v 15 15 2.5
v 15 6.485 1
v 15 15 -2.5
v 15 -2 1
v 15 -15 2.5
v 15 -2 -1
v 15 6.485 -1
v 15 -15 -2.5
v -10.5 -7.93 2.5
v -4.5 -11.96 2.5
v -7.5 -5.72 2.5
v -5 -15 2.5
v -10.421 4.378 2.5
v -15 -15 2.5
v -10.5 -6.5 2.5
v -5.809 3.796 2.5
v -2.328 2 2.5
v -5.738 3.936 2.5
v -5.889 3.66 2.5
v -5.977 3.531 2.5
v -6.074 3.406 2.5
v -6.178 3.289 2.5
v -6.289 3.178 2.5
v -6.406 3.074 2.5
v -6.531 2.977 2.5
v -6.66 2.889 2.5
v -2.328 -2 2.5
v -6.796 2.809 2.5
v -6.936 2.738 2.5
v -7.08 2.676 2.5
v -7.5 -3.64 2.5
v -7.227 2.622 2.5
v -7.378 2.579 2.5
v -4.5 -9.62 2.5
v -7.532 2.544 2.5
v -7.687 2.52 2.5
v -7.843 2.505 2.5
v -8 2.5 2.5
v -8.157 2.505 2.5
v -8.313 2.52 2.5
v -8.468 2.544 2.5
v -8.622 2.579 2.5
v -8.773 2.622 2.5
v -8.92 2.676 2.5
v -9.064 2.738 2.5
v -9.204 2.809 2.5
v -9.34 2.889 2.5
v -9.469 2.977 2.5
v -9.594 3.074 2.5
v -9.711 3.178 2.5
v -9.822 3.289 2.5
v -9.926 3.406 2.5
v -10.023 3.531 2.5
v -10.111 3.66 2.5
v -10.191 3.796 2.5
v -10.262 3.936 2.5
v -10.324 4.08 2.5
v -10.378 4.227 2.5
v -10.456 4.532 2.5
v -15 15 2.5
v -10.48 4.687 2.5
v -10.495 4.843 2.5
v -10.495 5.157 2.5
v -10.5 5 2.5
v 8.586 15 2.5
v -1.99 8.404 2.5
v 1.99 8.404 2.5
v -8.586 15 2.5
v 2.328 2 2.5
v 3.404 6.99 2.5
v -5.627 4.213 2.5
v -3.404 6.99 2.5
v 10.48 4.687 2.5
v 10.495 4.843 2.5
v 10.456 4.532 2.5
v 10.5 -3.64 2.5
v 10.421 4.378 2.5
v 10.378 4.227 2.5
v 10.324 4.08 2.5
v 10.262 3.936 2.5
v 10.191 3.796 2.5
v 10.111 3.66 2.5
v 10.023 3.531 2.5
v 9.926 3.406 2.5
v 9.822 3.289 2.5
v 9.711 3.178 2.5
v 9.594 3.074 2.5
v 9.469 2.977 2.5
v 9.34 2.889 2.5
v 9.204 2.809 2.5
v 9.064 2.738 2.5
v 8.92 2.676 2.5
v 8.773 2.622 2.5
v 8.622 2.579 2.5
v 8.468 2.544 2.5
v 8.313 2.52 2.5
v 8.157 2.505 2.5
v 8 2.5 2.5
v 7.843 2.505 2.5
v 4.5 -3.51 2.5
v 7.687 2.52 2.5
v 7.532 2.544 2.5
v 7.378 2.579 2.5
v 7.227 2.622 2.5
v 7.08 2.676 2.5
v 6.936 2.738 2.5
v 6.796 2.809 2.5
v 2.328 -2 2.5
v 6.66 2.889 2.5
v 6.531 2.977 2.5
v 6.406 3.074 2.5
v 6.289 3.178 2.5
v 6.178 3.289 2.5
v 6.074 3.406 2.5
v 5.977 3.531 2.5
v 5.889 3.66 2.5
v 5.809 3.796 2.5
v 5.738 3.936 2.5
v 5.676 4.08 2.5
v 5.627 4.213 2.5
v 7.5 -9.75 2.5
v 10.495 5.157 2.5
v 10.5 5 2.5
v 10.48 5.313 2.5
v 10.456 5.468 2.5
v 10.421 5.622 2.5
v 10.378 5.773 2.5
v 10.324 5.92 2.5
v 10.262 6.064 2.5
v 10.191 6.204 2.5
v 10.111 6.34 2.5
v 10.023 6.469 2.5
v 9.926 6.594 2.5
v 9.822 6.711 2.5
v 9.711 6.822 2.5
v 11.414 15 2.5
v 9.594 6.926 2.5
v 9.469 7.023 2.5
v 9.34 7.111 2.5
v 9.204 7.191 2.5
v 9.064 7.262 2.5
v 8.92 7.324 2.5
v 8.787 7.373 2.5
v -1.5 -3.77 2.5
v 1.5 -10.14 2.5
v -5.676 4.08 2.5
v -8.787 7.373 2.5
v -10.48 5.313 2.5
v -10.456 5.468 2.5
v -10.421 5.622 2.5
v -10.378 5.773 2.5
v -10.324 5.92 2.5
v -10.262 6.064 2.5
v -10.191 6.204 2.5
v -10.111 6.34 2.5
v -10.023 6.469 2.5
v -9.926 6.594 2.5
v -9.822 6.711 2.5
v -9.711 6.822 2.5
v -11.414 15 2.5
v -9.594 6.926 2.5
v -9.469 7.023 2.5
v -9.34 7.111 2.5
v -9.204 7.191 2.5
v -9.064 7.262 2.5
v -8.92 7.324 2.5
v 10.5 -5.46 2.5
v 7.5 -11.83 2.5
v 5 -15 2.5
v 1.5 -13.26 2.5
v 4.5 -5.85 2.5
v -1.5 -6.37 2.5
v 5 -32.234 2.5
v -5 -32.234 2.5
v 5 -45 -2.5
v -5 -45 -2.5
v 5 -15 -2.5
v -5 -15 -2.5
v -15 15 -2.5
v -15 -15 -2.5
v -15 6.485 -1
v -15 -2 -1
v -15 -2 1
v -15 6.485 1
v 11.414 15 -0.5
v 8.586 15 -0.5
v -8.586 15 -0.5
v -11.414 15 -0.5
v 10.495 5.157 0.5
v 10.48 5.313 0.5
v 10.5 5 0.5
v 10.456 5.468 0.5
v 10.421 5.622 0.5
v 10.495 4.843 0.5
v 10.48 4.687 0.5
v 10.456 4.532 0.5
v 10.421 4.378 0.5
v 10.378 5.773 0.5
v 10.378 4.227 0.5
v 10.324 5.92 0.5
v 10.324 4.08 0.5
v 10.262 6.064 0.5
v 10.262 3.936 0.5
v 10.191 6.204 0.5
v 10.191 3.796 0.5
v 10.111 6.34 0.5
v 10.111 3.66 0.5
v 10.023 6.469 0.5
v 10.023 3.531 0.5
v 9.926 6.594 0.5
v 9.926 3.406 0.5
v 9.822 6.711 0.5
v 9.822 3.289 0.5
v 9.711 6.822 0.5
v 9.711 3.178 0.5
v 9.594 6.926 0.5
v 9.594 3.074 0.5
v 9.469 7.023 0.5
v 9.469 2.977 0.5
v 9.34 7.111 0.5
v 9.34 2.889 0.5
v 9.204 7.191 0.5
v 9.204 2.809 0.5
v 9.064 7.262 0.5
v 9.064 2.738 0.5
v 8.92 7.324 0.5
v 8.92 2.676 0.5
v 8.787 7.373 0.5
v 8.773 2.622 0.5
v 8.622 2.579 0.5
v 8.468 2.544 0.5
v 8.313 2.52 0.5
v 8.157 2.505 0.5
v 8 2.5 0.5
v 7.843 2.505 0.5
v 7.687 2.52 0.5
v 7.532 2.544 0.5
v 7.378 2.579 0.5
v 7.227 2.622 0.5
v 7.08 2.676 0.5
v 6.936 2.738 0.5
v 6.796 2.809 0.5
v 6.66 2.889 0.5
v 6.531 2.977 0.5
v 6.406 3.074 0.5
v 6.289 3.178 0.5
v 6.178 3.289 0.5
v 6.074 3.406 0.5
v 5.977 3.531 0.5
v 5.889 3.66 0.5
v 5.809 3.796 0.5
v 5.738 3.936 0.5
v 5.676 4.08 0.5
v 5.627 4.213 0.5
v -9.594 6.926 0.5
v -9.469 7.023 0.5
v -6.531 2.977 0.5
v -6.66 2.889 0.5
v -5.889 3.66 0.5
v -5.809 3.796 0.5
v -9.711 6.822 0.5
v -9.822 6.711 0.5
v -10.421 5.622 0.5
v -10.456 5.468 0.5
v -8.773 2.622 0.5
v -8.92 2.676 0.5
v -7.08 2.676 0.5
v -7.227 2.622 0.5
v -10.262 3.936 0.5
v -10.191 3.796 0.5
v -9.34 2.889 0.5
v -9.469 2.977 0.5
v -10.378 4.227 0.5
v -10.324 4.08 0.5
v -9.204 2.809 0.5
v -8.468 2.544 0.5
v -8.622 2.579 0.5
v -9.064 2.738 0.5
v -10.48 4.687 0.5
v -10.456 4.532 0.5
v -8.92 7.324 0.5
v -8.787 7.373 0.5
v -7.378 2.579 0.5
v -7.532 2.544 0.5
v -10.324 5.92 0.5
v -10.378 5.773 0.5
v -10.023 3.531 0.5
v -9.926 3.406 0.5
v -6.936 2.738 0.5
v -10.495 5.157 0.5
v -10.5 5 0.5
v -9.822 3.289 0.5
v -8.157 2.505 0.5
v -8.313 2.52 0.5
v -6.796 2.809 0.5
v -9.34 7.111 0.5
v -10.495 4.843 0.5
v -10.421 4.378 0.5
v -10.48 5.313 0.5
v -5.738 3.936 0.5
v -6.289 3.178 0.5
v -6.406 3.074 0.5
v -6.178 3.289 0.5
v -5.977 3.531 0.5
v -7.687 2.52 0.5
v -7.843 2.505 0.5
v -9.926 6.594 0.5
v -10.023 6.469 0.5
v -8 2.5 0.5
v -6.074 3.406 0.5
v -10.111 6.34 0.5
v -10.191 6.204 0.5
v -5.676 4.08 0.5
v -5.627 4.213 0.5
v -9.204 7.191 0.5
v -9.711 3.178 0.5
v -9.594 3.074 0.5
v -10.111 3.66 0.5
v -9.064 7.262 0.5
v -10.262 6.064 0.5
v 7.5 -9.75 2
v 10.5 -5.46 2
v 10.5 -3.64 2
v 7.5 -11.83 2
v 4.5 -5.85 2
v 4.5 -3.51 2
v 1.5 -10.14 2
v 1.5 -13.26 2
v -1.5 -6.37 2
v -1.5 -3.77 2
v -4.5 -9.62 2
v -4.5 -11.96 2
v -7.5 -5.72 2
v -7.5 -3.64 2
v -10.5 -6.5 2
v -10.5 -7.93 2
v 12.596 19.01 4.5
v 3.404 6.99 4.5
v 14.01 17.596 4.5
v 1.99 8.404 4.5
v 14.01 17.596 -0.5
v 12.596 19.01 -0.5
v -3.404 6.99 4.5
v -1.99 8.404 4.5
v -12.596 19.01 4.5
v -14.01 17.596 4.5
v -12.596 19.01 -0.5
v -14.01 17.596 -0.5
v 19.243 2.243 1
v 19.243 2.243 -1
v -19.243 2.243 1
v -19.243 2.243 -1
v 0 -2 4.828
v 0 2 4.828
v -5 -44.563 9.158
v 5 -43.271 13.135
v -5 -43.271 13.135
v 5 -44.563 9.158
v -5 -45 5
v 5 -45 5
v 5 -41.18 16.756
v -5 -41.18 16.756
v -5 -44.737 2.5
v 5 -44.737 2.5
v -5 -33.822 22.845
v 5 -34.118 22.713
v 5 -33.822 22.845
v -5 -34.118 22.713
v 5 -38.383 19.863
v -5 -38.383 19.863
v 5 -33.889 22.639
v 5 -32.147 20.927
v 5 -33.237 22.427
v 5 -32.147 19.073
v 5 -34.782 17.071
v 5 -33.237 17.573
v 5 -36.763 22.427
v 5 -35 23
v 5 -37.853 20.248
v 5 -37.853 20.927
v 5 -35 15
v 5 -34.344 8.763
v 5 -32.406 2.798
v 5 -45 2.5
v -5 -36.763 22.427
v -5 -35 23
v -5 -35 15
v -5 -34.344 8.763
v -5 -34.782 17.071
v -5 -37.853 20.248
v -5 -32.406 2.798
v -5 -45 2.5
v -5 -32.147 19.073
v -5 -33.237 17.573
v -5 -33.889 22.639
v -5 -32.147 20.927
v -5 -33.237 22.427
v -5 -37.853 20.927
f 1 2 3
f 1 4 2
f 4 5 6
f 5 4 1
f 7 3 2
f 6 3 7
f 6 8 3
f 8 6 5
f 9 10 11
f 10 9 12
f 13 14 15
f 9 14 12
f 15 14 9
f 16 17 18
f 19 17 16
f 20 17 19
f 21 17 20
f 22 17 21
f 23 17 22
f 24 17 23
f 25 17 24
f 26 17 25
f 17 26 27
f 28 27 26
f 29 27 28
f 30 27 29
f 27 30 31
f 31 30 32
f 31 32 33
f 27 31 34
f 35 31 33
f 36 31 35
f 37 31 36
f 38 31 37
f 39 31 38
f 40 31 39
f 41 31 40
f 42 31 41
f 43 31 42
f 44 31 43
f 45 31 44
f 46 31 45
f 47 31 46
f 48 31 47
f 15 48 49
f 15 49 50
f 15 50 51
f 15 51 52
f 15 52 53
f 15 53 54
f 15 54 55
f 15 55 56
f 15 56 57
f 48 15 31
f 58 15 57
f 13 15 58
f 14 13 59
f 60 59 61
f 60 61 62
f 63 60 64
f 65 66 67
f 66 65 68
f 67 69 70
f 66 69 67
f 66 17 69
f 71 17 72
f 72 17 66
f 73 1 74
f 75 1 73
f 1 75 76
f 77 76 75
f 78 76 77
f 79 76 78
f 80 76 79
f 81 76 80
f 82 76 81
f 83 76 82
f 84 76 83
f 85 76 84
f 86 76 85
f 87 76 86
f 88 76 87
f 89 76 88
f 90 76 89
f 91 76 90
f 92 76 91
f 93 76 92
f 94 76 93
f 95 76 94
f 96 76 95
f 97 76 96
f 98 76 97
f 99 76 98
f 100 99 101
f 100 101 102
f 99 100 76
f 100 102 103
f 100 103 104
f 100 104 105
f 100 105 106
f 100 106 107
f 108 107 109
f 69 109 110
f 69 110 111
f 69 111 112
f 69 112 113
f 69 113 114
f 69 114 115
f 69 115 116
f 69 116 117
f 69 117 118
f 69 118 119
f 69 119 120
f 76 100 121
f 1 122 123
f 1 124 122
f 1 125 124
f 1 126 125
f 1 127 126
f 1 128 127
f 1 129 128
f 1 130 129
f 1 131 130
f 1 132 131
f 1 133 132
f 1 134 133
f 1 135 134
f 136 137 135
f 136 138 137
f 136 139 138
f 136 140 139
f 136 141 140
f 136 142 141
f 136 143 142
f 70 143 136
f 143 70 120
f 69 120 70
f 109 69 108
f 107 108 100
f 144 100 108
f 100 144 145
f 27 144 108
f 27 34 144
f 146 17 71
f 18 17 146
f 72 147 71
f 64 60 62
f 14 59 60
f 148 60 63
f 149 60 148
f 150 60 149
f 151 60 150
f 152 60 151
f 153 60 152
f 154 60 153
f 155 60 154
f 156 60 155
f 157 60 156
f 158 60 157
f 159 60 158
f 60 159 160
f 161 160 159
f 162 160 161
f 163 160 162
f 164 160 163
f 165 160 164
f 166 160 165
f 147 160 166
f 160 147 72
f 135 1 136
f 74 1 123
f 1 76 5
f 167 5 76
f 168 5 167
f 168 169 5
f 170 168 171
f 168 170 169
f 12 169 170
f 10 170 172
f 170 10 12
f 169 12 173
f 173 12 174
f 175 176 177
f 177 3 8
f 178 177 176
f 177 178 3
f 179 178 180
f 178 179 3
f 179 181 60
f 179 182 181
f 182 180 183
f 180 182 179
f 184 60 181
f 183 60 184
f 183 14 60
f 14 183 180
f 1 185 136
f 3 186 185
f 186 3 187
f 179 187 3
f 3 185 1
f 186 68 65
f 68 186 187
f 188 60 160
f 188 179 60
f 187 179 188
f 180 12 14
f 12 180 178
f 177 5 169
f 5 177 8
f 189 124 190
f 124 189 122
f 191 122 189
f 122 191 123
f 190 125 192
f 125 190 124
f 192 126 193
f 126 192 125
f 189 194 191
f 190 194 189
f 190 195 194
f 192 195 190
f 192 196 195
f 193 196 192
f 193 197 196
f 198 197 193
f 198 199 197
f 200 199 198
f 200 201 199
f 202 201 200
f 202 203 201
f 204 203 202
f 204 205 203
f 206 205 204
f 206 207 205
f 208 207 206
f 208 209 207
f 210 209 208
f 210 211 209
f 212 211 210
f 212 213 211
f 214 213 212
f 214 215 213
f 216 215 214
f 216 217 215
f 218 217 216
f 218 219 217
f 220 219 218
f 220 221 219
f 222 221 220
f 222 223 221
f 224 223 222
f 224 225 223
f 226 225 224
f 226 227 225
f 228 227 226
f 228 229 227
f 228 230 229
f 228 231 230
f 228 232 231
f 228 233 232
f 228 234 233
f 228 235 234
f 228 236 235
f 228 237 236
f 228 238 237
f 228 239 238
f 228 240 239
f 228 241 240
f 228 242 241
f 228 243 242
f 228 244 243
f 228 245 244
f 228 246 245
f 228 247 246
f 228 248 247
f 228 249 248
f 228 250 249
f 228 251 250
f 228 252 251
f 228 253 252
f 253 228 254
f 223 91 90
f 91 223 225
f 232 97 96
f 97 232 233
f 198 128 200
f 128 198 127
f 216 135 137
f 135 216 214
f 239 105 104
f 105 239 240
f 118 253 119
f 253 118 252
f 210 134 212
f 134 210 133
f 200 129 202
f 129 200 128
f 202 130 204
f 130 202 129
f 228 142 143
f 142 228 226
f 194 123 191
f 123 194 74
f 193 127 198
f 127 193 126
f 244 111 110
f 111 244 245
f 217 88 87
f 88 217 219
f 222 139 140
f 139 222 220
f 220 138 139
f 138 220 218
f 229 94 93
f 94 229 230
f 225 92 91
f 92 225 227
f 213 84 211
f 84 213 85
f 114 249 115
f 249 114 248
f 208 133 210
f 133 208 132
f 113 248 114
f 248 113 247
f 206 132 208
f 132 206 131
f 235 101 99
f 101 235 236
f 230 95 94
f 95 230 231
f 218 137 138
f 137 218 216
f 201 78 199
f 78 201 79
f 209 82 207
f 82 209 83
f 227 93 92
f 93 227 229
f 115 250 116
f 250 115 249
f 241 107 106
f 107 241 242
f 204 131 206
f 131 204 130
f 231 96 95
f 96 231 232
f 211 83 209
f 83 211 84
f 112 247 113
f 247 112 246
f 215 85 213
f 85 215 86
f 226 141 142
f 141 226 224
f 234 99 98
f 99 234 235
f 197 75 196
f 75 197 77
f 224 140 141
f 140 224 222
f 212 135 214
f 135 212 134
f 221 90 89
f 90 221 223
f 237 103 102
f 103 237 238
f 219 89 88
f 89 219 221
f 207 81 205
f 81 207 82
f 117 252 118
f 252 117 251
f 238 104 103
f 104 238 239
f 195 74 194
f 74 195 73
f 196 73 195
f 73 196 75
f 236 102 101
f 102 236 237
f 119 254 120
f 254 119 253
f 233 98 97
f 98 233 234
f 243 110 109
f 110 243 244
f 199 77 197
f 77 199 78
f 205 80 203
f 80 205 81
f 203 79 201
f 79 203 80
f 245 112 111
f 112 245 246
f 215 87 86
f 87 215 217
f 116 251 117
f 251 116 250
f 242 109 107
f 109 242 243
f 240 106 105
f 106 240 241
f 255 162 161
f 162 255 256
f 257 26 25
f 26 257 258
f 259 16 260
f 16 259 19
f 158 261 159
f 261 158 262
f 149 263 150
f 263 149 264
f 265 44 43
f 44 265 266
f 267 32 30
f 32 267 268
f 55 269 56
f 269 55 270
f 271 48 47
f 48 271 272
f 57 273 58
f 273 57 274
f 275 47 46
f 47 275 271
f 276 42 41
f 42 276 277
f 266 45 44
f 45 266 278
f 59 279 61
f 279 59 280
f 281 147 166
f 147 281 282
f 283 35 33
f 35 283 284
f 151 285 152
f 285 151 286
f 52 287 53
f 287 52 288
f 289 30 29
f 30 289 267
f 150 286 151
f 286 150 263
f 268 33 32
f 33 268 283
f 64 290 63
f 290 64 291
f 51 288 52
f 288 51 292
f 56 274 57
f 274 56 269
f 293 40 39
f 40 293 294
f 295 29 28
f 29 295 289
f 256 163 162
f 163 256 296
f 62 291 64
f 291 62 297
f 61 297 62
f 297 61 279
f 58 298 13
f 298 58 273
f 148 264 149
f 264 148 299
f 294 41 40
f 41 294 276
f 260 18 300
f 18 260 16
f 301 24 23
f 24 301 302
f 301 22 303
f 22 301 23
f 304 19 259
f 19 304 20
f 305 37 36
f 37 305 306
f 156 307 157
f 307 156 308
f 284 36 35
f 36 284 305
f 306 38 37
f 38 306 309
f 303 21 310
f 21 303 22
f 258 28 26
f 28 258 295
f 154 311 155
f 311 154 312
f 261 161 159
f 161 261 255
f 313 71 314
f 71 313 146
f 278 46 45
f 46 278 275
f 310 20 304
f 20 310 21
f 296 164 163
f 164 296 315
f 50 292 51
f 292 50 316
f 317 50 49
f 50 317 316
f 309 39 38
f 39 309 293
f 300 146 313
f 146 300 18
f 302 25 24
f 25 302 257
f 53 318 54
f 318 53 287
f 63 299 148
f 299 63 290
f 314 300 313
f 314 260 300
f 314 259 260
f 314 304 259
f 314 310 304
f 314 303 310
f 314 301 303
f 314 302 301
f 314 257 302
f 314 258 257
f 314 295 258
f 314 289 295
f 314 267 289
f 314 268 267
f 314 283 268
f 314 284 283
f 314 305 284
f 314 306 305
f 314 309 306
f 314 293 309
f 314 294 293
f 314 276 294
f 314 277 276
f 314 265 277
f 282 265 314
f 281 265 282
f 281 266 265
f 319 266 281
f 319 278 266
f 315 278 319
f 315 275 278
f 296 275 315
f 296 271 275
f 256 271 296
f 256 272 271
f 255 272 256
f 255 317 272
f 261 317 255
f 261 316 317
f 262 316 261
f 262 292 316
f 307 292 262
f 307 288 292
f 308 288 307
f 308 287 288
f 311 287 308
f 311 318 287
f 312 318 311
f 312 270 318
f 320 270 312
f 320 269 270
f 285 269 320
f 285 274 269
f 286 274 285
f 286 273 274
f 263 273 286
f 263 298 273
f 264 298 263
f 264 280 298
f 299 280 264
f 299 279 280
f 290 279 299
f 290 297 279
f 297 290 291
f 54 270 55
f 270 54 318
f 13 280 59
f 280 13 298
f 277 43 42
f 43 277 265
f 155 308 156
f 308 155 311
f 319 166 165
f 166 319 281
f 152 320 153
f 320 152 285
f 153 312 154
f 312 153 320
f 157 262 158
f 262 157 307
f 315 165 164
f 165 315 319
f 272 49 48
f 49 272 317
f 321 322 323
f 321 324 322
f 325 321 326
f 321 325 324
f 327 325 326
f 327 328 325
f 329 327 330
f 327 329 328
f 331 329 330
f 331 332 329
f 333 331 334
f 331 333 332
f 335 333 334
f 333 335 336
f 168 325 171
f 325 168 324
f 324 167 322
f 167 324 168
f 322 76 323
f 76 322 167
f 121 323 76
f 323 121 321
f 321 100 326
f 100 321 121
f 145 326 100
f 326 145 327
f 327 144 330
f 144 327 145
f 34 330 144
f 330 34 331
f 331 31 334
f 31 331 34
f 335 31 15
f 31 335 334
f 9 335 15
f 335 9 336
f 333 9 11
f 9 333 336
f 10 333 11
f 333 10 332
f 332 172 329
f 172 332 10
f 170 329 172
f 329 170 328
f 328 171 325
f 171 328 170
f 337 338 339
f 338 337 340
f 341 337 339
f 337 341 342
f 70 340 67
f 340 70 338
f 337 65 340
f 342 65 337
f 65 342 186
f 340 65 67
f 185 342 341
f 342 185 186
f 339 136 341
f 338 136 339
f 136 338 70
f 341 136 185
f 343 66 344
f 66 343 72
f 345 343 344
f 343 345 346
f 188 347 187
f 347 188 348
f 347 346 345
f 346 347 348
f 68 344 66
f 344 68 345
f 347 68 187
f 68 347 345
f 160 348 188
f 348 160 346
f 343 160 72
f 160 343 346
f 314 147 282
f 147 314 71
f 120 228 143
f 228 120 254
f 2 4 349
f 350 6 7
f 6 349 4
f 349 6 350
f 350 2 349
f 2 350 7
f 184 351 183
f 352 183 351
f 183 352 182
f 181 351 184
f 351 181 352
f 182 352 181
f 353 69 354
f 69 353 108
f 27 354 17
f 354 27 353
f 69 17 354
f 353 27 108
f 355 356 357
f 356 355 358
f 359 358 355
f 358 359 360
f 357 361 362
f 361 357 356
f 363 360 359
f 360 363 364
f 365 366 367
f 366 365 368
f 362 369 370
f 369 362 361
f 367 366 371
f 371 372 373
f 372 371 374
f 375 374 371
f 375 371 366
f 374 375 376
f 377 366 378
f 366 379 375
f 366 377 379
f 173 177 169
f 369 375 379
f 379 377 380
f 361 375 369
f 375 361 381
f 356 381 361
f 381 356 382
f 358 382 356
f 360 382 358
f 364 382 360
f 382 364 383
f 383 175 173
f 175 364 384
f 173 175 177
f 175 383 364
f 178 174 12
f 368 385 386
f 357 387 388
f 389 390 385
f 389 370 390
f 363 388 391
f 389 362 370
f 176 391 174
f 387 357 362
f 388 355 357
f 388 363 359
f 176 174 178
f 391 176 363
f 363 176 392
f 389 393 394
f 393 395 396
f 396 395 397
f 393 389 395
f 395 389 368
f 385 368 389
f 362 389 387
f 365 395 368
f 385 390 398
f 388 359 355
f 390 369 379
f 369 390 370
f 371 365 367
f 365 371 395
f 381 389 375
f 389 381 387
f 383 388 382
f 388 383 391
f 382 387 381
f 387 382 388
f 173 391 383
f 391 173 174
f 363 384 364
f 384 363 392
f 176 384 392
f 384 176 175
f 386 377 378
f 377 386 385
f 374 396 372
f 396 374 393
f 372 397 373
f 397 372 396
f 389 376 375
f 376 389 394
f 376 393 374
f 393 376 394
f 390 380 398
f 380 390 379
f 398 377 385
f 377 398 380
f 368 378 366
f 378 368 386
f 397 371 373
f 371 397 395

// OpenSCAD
module robot4()
{
    translate([8,13,2])
        rotate([0,0,45])
            cube([15,2,5], center=true);
    translate([-8,13,2])
        rotate([0,0,-45])
            cube([15,2,5], center=true);
    translate([-7,7,0])
        rotate([0,0,-45])
            cube([7,2,5], center=true);
    translate([7,7,0])
        rotate([0,0,45])
            cube([7,2,5], center=true);
	difference()
	{
		cube([30,30,5], center=true);
        // eyes
		translate([8,5,2])
        {
			cylinder(h=3, r=2.5, center=true, $fn=100);
        }
		translate([-8,5,2])
			cylinder(h=3, r=2.5, center=true, $fn=100);
        // mouth
        scale([1.5,1.3,1])
            translate([-7,-5,2])
                linear_extrude(height=4) 
                    polygon(points=[[0,0], [2,2.2], [4,-2.4], [6,2.1], [8,-2.8], [10,2.3], [12,-2.5], [14, 2.2], [14, .8], [12, -4.1], [10, .5], [8,-5.2], [6,.1], [4,-4.2], [2,.6], [0, -1.1] ]);
	}
    // ears
	translate([15,-2,-1])
        rotate([0,0,45])
            cube([6,6,2]);
	translate([-15,-2,-1])
        rotate([0,0,45])
            cube([6,6,2]);
    // nose
	translate([0,0,2])
        rotate([0,45,0])
        cube([4,4,4], center=true);
}

module robot3()
{
	difference()
	{
		cube([30,30,5], center=true);
        // eyes
		translate([8,5,2])
			cylinder(h=3, r=2.5, center=true, $fn=100);
		translate([-8,5,2])
			cylinder(h=3, r=2.5, center=true, $fn=100);
        // mouth
		union()
		{
            // right side of mouth
			translate([0,-9,2])
				cylinder(h=3, r=4, center=true, $fn=100);
		}
	}
    // ears
	translate([15,0,-1])
        cylinder(h=3, r=4, center=true, $fn=100);
	translate([-15,0,-1])
        cylinder(h=3, r=4, center=true, $fn=100);
    // nose
	translate([0,0,2])
        sphere(r=3, center=true, $fn=100);
}

module robot2()
{
	difference()
	{
		cube([30,30,5], center=true);
        // eyes
		translate([8,5,2])
			cylinder(h=3, r=2, center=true, $fn=100);
		translate([-8,5,2])
			cylinder(h=3, r=2, center=true, $fn=100);
        // mouth
		union()
		{
            // right side of mouth
			translate([8,-6.5,2])
				cylinder(h=3, r=2, center=true, $fn=100);
            // left side of mouth
			translate([-8,-6.5,2])
				cylinder(h=3, r=2, center=true, $fn=100);
            // center of mouth
			translate([0,-7,2])
				cube([15,3,3], center=true);
		}
	}
    // ears
	translate([0,0,-1])
		cube([38,6,3], center=true);
    // nose
    difference()
    {
        translate([0,0,0])
            rotate([0,90,90])
                cylinder(h=3, r=5, center=true, $fn=100);
        translate([0,0,-5])
            cube([30,30,5], center=true);
    }
    // antenna
    union()
    {
        translate([0,15,0])
            rotate([0,90,90])
                cylinder(h=15, r=1, center=true, $fn=100);
        translate([0,22,0])
            sphere(r=2, $fn=100);
    }
}

module robot()
{
	difference()
	{
		cube([30,30,5], center=true);
		translate([8,5,2])
			cylinder(h=3, r=3, center=true);
		translate([-8,5,2])
			cylinder(h=3, r=3, center=true);
		union()
		{
			translate([8,-7,2])
				cylinder(h=3, r=3, center=true);
			translate([-8,-7,2])
				cylinder(h=3, r=3, center=true);
			translate([0,-7,2])
				cube([15,6,3], center=true);
		}
	}
	translate([0,0,-1])
		cube([38,5,3], center=true);
}

module hanger()
{
	cube([10,30,5], center=true);
	translate([0,5,5])
		rotate([90,0,0])
			rotate([0,-90,0])
				difference()
				{
					cylinder(r=20, h=10, center=true);
					translate([-20,10,0])
						cylinder(r=30, h=10, center=true);
					translate([0,-15,0])
						cube([50,20,10], center=true);
				}
	translate([0,-5,20])
		rotate([0,90,0])
			cylinder(h=10, r=3, center=true);
}


robot4();
translate([0,-30,0])
    hanger();
